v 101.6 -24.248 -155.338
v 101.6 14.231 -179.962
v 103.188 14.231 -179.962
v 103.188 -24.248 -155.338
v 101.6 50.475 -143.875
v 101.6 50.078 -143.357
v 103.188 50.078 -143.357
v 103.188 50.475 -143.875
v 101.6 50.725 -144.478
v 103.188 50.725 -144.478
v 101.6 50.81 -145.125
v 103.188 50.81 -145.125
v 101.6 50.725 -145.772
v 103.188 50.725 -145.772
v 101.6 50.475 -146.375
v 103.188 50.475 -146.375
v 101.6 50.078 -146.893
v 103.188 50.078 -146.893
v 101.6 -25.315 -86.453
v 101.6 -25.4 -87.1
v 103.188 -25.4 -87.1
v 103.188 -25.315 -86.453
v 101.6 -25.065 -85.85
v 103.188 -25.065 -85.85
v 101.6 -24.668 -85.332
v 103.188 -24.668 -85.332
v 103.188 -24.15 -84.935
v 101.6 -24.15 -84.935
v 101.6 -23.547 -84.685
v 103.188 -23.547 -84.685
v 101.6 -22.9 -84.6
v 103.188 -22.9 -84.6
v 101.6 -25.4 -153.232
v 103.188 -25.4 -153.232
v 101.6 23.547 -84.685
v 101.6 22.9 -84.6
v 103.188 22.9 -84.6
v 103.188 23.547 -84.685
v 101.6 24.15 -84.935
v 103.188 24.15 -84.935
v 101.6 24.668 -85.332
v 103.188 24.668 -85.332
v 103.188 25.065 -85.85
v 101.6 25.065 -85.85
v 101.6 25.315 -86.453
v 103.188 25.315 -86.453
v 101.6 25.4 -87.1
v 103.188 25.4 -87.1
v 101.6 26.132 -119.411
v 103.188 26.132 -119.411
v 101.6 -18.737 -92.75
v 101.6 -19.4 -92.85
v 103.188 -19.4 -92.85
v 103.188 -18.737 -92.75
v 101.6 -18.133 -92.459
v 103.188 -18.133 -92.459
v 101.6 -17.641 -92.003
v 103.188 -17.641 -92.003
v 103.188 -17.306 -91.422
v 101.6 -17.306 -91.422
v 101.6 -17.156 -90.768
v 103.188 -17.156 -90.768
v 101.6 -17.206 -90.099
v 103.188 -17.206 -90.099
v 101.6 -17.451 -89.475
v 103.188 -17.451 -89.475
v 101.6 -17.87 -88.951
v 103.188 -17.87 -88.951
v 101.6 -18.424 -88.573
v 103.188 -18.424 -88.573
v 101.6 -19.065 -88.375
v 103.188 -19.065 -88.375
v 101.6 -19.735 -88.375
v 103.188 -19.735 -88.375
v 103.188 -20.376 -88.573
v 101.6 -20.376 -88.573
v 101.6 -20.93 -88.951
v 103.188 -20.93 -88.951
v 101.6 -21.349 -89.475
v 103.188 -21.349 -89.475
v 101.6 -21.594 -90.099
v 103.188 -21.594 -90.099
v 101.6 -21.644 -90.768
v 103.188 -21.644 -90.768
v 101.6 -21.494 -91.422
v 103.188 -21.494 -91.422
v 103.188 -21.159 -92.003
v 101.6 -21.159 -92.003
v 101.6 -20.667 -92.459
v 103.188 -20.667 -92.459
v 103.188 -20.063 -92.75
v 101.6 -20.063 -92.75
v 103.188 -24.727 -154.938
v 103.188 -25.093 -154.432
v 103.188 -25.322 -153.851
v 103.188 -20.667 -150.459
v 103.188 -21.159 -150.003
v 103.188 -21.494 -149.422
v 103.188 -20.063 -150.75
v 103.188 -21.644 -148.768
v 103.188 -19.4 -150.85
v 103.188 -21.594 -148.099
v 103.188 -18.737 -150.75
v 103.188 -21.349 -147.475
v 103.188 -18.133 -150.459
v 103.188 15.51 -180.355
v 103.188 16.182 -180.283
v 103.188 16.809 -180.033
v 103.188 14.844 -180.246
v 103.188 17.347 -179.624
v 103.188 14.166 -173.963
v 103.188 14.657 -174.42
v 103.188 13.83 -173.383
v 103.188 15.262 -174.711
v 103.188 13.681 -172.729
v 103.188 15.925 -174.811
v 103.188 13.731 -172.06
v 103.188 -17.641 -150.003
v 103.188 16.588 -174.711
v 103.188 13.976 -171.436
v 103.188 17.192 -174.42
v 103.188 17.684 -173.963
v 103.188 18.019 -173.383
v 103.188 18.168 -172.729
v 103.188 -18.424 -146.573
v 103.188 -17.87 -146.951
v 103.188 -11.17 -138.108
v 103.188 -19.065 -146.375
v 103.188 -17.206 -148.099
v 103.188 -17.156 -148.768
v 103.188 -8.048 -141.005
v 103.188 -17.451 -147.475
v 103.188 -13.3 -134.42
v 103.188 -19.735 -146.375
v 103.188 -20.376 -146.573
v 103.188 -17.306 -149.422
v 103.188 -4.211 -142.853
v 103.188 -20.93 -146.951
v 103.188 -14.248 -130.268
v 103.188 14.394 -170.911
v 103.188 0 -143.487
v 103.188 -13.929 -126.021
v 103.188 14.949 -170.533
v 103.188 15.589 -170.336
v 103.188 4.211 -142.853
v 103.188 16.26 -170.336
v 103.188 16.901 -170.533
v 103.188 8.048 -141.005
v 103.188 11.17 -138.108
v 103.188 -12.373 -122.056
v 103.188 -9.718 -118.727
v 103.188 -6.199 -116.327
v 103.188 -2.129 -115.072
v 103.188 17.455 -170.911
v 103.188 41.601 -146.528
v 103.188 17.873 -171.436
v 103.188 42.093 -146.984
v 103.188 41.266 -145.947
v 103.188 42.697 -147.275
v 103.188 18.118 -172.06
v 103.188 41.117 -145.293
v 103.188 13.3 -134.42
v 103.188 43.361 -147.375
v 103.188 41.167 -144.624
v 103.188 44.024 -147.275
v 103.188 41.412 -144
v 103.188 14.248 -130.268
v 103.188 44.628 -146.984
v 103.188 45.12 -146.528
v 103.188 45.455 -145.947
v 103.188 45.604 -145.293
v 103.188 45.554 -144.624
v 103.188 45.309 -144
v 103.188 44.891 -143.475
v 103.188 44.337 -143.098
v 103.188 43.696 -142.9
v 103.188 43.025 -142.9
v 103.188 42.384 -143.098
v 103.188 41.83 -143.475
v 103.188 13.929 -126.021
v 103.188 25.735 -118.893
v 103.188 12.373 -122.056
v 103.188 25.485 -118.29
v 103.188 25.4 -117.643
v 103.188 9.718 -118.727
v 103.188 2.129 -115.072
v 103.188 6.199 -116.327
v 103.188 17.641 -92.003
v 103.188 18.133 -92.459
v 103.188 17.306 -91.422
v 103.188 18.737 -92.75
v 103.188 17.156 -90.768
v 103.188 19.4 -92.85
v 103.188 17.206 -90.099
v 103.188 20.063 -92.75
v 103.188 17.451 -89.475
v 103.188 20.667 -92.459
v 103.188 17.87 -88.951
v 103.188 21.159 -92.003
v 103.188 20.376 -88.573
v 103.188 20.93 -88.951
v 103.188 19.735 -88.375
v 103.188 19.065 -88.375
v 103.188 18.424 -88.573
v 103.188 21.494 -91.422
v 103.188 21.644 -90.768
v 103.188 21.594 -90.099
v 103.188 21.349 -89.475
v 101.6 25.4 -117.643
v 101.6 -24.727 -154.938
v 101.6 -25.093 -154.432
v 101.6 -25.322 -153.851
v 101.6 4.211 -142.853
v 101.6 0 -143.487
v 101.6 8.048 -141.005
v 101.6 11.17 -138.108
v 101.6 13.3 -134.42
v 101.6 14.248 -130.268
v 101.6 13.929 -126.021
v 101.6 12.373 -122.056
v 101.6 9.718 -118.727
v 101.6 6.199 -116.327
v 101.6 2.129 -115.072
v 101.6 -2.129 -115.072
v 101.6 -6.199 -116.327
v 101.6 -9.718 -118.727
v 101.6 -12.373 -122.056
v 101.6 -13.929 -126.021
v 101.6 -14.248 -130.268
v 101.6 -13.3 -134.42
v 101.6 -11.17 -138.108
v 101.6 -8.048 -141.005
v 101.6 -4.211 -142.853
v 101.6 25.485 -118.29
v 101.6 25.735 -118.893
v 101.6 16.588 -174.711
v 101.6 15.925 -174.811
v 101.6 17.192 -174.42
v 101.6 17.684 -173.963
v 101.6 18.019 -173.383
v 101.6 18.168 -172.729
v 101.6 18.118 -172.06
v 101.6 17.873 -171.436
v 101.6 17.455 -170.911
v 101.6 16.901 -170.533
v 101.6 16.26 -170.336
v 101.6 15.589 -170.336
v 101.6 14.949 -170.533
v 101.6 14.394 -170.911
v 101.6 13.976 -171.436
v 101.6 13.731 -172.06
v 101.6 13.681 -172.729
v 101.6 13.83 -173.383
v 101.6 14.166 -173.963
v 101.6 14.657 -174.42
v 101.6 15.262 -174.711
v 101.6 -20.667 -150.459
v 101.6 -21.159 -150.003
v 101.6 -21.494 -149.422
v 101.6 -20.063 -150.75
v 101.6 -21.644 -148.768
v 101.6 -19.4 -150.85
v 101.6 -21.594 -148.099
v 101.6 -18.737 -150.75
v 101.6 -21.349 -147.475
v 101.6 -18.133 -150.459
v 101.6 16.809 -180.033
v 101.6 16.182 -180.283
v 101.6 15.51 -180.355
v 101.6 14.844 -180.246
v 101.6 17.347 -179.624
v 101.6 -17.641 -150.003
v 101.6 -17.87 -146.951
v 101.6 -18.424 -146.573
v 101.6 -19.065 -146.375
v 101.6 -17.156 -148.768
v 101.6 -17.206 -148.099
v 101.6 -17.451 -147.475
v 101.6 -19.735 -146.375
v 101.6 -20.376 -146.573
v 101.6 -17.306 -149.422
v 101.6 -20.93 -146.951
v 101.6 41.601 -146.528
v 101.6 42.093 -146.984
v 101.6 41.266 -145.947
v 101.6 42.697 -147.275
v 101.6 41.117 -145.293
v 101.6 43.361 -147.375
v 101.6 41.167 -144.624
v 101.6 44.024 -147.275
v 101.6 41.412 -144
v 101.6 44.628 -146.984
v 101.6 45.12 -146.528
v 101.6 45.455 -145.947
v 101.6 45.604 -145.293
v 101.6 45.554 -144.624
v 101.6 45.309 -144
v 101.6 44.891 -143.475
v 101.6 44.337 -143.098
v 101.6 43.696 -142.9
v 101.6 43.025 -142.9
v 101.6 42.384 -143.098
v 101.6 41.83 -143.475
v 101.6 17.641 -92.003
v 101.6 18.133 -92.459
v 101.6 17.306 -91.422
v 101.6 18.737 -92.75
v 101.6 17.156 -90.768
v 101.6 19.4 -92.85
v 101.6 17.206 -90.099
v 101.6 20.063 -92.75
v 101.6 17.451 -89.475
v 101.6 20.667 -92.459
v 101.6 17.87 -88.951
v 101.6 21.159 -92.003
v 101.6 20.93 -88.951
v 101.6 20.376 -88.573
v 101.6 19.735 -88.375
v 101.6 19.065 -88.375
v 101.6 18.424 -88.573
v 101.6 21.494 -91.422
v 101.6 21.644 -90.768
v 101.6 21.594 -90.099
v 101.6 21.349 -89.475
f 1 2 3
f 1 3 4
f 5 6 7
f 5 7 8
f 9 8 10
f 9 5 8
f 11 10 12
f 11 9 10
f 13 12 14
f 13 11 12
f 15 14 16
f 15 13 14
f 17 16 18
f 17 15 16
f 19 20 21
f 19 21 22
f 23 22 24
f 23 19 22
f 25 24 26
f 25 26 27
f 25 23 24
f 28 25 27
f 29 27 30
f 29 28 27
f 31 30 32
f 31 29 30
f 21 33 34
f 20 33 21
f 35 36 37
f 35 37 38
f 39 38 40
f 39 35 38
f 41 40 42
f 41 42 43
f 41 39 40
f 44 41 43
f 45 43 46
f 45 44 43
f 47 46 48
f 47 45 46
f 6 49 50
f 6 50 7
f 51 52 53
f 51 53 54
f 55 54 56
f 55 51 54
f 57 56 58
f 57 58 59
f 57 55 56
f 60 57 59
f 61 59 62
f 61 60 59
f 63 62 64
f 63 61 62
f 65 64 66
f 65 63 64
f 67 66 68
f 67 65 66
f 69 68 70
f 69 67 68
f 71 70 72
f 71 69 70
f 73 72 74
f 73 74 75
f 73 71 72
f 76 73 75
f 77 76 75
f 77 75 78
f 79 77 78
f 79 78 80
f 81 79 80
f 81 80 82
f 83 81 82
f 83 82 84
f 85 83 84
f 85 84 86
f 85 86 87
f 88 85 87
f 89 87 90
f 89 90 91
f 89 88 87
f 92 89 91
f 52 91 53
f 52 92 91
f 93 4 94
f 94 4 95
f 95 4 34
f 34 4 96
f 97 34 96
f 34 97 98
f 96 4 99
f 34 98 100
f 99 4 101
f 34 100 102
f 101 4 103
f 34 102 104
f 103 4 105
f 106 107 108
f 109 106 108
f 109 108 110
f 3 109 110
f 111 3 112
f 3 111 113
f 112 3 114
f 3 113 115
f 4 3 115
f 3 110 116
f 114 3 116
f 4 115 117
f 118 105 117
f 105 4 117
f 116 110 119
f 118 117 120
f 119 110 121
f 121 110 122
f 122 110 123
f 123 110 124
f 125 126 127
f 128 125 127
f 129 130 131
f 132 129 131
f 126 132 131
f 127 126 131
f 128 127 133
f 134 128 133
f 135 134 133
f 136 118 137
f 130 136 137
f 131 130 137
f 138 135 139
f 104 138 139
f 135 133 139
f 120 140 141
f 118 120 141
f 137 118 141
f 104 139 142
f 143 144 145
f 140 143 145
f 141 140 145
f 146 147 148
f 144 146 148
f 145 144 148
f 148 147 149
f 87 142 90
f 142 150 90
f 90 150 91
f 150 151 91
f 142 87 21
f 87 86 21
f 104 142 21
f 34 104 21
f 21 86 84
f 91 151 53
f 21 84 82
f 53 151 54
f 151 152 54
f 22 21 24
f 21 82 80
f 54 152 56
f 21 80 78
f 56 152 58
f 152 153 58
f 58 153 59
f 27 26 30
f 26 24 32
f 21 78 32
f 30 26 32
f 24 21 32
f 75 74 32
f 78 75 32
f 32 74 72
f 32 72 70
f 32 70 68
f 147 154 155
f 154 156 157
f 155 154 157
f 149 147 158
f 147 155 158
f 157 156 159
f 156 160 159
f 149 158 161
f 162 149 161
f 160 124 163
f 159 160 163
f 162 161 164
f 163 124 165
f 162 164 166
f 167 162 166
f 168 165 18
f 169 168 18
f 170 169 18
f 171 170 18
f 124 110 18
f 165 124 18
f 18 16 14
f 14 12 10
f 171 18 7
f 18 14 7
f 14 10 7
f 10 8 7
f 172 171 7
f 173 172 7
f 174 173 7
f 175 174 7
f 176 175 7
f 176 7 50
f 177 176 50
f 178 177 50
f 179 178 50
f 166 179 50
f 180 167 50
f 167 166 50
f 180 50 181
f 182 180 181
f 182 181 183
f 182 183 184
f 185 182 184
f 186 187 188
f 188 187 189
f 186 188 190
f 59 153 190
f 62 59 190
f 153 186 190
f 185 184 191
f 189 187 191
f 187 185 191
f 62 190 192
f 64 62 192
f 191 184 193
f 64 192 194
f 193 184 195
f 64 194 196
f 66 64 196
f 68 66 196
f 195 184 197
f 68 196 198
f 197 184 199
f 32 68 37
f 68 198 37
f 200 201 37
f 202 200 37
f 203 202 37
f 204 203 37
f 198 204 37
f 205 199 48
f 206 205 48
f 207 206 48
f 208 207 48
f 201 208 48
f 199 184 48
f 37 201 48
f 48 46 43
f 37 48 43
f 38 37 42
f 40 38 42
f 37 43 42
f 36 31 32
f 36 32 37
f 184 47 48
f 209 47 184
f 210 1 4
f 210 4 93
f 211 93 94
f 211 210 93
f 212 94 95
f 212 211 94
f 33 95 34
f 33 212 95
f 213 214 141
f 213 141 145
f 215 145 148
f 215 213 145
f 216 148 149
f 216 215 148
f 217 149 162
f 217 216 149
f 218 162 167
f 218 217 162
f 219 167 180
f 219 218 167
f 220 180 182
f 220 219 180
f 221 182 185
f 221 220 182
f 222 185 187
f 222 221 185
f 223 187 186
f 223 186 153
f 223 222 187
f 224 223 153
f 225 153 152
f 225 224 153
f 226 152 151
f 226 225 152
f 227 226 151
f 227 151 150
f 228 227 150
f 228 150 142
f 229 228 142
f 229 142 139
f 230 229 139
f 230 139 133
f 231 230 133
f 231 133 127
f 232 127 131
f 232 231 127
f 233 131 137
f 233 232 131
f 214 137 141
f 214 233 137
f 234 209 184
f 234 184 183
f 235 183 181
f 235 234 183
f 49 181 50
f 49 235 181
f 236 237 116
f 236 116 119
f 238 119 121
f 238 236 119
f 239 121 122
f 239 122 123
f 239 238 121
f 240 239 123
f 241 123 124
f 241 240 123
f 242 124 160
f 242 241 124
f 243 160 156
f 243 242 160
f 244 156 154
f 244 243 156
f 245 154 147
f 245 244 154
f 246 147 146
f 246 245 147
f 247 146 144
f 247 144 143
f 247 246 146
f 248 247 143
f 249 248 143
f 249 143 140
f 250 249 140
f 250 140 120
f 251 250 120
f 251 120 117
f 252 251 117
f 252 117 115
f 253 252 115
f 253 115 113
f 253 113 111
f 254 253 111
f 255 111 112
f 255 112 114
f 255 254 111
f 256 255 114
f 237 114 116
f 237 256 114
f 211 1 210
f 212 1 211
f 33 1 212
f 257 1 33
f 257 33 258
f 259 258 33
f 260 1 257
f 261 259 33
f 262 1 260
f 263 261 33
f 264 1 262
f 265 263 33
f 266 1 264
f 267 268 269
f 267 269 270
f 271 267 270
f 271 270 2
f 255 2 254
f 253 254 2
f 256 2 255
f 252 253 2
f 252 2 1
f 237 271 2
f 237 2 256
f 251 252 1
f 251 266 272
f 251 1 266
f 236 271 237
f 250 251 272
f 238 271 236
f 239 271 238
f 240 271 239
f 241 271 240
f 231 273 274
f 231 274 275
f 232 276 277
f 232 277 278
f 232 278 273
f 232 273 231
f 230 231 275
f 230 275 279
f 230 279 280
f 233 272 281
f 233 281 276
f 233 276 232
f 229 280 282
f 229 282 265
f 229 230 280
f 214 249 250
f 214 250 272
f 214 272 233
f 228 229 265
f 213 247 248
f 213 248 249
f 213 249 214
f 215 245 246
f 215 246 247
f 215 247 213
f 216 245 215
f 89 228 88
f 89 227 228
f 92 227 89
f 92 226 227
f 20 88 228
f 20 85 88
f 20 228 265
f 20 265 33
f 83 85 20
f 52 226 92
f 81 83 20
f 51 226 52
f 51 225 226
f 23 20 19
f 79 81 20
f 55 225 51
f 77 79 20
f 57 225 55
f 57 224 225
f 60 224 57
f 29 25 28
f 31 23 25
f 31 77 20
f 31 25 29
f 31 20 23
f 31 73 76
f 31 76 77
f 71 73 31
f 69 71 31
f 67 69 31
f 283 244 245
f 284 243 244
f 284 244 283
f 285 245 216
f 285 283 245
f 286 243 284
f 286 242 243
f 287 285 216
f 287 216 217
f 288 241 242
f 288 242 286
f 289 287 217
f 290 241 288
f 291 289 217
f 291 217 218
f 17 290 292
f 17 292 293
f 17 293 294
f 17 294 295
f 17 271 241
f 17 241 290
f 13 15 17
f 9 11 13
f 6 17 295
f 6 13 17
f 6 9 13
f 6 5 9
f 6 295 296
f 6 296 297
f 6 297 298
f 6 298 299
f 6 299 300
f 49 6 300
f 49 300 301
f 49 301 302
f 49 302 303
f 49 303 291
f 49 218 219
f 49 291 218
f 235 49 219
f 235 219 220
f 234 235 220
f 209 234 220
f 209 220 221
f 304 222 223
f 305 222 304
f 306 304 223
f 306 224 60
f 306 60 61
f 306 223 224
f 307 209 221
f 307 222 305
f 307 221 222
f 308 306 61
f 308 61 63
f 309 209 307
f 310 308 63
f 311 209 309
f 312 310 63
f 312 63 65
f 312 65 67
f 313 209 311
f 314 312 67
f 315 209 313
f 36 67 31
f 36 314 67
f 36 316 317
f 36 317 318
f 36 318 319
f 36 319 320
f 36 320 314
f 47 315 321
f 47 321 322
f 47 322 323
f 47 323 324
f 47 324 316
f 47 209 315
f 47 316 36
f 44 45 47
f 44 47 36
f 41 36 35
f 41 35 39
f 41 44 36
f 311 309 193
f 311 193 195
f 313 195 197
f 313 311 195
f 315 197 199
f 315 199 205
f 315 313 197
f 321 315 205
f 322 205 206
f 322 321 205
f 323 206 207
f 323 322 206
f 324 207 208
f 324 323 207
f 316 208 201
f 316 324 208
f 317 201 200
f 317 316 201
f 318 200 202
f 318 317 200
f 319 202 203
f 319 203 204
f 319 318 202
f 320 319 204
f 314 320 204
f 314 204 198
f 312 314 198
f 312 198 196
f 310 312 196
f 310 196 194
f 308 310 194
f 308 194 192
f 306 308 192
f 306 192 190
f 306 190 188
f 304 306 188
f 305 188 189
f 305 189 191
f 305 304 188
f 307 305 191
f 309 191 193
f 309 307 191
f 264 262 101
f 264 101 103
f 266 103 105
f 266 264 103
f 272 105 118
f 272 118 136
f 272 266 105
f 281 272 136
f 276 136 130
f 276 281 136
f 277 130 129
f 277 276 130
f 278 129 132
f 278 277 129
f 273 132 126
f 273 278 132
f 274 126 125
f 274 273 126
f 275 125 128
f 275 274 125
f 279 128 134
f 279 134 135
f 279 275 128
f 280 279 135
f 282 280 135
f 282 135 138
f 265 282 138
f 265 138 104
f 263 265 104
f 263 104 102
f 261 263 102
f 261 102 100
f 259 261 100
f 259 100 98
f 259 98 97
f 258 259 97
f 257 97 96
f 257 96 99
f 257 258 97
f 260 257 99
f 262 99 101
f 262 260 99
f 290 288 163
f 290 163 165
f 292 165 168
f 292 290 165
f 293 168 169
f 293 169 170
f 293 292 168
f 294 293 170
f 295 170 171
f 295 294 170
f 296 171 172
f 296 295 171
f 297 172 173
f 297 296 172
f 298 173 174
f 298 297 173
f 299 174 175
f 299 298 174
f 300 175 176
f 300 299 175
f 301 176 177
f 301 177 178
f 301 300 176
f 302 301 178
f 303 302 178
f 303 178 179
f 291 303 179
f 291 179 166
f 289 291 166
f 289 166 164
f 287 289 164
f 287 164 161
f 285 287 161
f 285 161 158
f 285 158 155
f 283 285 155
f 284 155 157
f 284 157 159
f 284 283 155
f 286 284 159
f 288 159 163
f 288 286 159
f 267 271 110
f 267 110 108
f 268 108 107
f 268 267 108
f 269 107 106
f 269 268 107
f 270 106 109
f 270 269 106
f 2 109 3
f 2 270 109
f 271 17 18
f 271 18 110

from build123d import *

# Parameters (mm, degrees)
SKETCH1_EXCAVATOR_MASTERSKETCH_3_R   = 2.25
SKETCH1_EXCAVATOR_MASTERSKETCH_3_R_2 = 14.2875
BOSS_EXTRUDE1_DEPTH                  = 1.5875


with BuildPart() as part:
    # Sketch1-Excavator Mastersketch_3 → Boss-Extrude1 (new body)
    with BuildSketch(Plane(origin=(101.6, 0, 0), x_dir=(0, 0, -1), z_dir=(1, 0, 0))):
        with BuildLine():
            Line((87.1, -25.4), (153.231778176, -25.4))
            ThreePointArc((153.231778176, -25.4), (153.945606164, -25.295923539), (154.6, -24.992359682))
            ThreePointArc((154.6, -24.992359682), (155.00822415, -24.65904511), (155.337504304, -24.247559823))
            Line((155.337504304, -24.247559823), (179.961994288, 14.231200859))
            ThreePointArc((179.961994288, 14.231200859), (180.341686112, 15.848385623), (179.624035114, 17.346527635))
            Line((179.624035114, 17.346527635), (146.892536085, 50.078026663))
            ThreePointArc((146.892536085, 50.078026663), (145.124769132, 50.81025971), (143.357002179, 50.078026663))
            Line((143.357002179, 50.078026663), (119.411208563, 26.132233047))
            ThreePointArc((119.411208563, 26.132233047), (118.600150191, 25.590301169), (117.64344161, 25.4))
            Line((117.64344161, 25.4), (87.1, 25.4))
            ThreePointArc((87.1, 25.4), (85.332233047, 24.667766953), (84.6, 22.9))
            Line((84.6, 22.9), (84.6, -22.9))
            ThreePointArc((84.6, -22.9), (85.332233047, -24.667766953), (87.1, -25.4))
        make_face()
        with Locations((90.6, -19.4)):
            Circle(SKETCH1_EXCAVATOR_MASTERSKETCH_3_R, mode=Mode.SUBTRACT)
        with Locations((129.2, 0)):
            Circle(SKETCH1_EXCAVATOR_MASTERSKETCH_3_R_2, mode=Mode.SUBTRACT)
        with Locations((148.6, -19.4)):
            Circle(SKETCH1_EXCAVATOR_MASTERSKETCH_3_R, mode=Mode.SUBTRACT)
        with Locations((90.6, 19.4)):
            Circle(SKETCH1_EXCAVATOR_MASTERSKETCH_3_R, mode=Mode.SUBTRACT)
        with Locations((172.560512242, 15.924769132)):
            Circle(SKETCH1_EXCAVATOR_MASTERSKETCH_3_R, mode=Mode.SUBTRACT)
        with Locations((145.124769132, 43.360512242)):
            Circle(SKETCH1_EXCAVATOR_MASTERSKETCH_3_R, mode=Mode.SUBTRACT)
    extrude(amount=BOSS_EXTRUDE1_DEPTH)


solid = part.part
